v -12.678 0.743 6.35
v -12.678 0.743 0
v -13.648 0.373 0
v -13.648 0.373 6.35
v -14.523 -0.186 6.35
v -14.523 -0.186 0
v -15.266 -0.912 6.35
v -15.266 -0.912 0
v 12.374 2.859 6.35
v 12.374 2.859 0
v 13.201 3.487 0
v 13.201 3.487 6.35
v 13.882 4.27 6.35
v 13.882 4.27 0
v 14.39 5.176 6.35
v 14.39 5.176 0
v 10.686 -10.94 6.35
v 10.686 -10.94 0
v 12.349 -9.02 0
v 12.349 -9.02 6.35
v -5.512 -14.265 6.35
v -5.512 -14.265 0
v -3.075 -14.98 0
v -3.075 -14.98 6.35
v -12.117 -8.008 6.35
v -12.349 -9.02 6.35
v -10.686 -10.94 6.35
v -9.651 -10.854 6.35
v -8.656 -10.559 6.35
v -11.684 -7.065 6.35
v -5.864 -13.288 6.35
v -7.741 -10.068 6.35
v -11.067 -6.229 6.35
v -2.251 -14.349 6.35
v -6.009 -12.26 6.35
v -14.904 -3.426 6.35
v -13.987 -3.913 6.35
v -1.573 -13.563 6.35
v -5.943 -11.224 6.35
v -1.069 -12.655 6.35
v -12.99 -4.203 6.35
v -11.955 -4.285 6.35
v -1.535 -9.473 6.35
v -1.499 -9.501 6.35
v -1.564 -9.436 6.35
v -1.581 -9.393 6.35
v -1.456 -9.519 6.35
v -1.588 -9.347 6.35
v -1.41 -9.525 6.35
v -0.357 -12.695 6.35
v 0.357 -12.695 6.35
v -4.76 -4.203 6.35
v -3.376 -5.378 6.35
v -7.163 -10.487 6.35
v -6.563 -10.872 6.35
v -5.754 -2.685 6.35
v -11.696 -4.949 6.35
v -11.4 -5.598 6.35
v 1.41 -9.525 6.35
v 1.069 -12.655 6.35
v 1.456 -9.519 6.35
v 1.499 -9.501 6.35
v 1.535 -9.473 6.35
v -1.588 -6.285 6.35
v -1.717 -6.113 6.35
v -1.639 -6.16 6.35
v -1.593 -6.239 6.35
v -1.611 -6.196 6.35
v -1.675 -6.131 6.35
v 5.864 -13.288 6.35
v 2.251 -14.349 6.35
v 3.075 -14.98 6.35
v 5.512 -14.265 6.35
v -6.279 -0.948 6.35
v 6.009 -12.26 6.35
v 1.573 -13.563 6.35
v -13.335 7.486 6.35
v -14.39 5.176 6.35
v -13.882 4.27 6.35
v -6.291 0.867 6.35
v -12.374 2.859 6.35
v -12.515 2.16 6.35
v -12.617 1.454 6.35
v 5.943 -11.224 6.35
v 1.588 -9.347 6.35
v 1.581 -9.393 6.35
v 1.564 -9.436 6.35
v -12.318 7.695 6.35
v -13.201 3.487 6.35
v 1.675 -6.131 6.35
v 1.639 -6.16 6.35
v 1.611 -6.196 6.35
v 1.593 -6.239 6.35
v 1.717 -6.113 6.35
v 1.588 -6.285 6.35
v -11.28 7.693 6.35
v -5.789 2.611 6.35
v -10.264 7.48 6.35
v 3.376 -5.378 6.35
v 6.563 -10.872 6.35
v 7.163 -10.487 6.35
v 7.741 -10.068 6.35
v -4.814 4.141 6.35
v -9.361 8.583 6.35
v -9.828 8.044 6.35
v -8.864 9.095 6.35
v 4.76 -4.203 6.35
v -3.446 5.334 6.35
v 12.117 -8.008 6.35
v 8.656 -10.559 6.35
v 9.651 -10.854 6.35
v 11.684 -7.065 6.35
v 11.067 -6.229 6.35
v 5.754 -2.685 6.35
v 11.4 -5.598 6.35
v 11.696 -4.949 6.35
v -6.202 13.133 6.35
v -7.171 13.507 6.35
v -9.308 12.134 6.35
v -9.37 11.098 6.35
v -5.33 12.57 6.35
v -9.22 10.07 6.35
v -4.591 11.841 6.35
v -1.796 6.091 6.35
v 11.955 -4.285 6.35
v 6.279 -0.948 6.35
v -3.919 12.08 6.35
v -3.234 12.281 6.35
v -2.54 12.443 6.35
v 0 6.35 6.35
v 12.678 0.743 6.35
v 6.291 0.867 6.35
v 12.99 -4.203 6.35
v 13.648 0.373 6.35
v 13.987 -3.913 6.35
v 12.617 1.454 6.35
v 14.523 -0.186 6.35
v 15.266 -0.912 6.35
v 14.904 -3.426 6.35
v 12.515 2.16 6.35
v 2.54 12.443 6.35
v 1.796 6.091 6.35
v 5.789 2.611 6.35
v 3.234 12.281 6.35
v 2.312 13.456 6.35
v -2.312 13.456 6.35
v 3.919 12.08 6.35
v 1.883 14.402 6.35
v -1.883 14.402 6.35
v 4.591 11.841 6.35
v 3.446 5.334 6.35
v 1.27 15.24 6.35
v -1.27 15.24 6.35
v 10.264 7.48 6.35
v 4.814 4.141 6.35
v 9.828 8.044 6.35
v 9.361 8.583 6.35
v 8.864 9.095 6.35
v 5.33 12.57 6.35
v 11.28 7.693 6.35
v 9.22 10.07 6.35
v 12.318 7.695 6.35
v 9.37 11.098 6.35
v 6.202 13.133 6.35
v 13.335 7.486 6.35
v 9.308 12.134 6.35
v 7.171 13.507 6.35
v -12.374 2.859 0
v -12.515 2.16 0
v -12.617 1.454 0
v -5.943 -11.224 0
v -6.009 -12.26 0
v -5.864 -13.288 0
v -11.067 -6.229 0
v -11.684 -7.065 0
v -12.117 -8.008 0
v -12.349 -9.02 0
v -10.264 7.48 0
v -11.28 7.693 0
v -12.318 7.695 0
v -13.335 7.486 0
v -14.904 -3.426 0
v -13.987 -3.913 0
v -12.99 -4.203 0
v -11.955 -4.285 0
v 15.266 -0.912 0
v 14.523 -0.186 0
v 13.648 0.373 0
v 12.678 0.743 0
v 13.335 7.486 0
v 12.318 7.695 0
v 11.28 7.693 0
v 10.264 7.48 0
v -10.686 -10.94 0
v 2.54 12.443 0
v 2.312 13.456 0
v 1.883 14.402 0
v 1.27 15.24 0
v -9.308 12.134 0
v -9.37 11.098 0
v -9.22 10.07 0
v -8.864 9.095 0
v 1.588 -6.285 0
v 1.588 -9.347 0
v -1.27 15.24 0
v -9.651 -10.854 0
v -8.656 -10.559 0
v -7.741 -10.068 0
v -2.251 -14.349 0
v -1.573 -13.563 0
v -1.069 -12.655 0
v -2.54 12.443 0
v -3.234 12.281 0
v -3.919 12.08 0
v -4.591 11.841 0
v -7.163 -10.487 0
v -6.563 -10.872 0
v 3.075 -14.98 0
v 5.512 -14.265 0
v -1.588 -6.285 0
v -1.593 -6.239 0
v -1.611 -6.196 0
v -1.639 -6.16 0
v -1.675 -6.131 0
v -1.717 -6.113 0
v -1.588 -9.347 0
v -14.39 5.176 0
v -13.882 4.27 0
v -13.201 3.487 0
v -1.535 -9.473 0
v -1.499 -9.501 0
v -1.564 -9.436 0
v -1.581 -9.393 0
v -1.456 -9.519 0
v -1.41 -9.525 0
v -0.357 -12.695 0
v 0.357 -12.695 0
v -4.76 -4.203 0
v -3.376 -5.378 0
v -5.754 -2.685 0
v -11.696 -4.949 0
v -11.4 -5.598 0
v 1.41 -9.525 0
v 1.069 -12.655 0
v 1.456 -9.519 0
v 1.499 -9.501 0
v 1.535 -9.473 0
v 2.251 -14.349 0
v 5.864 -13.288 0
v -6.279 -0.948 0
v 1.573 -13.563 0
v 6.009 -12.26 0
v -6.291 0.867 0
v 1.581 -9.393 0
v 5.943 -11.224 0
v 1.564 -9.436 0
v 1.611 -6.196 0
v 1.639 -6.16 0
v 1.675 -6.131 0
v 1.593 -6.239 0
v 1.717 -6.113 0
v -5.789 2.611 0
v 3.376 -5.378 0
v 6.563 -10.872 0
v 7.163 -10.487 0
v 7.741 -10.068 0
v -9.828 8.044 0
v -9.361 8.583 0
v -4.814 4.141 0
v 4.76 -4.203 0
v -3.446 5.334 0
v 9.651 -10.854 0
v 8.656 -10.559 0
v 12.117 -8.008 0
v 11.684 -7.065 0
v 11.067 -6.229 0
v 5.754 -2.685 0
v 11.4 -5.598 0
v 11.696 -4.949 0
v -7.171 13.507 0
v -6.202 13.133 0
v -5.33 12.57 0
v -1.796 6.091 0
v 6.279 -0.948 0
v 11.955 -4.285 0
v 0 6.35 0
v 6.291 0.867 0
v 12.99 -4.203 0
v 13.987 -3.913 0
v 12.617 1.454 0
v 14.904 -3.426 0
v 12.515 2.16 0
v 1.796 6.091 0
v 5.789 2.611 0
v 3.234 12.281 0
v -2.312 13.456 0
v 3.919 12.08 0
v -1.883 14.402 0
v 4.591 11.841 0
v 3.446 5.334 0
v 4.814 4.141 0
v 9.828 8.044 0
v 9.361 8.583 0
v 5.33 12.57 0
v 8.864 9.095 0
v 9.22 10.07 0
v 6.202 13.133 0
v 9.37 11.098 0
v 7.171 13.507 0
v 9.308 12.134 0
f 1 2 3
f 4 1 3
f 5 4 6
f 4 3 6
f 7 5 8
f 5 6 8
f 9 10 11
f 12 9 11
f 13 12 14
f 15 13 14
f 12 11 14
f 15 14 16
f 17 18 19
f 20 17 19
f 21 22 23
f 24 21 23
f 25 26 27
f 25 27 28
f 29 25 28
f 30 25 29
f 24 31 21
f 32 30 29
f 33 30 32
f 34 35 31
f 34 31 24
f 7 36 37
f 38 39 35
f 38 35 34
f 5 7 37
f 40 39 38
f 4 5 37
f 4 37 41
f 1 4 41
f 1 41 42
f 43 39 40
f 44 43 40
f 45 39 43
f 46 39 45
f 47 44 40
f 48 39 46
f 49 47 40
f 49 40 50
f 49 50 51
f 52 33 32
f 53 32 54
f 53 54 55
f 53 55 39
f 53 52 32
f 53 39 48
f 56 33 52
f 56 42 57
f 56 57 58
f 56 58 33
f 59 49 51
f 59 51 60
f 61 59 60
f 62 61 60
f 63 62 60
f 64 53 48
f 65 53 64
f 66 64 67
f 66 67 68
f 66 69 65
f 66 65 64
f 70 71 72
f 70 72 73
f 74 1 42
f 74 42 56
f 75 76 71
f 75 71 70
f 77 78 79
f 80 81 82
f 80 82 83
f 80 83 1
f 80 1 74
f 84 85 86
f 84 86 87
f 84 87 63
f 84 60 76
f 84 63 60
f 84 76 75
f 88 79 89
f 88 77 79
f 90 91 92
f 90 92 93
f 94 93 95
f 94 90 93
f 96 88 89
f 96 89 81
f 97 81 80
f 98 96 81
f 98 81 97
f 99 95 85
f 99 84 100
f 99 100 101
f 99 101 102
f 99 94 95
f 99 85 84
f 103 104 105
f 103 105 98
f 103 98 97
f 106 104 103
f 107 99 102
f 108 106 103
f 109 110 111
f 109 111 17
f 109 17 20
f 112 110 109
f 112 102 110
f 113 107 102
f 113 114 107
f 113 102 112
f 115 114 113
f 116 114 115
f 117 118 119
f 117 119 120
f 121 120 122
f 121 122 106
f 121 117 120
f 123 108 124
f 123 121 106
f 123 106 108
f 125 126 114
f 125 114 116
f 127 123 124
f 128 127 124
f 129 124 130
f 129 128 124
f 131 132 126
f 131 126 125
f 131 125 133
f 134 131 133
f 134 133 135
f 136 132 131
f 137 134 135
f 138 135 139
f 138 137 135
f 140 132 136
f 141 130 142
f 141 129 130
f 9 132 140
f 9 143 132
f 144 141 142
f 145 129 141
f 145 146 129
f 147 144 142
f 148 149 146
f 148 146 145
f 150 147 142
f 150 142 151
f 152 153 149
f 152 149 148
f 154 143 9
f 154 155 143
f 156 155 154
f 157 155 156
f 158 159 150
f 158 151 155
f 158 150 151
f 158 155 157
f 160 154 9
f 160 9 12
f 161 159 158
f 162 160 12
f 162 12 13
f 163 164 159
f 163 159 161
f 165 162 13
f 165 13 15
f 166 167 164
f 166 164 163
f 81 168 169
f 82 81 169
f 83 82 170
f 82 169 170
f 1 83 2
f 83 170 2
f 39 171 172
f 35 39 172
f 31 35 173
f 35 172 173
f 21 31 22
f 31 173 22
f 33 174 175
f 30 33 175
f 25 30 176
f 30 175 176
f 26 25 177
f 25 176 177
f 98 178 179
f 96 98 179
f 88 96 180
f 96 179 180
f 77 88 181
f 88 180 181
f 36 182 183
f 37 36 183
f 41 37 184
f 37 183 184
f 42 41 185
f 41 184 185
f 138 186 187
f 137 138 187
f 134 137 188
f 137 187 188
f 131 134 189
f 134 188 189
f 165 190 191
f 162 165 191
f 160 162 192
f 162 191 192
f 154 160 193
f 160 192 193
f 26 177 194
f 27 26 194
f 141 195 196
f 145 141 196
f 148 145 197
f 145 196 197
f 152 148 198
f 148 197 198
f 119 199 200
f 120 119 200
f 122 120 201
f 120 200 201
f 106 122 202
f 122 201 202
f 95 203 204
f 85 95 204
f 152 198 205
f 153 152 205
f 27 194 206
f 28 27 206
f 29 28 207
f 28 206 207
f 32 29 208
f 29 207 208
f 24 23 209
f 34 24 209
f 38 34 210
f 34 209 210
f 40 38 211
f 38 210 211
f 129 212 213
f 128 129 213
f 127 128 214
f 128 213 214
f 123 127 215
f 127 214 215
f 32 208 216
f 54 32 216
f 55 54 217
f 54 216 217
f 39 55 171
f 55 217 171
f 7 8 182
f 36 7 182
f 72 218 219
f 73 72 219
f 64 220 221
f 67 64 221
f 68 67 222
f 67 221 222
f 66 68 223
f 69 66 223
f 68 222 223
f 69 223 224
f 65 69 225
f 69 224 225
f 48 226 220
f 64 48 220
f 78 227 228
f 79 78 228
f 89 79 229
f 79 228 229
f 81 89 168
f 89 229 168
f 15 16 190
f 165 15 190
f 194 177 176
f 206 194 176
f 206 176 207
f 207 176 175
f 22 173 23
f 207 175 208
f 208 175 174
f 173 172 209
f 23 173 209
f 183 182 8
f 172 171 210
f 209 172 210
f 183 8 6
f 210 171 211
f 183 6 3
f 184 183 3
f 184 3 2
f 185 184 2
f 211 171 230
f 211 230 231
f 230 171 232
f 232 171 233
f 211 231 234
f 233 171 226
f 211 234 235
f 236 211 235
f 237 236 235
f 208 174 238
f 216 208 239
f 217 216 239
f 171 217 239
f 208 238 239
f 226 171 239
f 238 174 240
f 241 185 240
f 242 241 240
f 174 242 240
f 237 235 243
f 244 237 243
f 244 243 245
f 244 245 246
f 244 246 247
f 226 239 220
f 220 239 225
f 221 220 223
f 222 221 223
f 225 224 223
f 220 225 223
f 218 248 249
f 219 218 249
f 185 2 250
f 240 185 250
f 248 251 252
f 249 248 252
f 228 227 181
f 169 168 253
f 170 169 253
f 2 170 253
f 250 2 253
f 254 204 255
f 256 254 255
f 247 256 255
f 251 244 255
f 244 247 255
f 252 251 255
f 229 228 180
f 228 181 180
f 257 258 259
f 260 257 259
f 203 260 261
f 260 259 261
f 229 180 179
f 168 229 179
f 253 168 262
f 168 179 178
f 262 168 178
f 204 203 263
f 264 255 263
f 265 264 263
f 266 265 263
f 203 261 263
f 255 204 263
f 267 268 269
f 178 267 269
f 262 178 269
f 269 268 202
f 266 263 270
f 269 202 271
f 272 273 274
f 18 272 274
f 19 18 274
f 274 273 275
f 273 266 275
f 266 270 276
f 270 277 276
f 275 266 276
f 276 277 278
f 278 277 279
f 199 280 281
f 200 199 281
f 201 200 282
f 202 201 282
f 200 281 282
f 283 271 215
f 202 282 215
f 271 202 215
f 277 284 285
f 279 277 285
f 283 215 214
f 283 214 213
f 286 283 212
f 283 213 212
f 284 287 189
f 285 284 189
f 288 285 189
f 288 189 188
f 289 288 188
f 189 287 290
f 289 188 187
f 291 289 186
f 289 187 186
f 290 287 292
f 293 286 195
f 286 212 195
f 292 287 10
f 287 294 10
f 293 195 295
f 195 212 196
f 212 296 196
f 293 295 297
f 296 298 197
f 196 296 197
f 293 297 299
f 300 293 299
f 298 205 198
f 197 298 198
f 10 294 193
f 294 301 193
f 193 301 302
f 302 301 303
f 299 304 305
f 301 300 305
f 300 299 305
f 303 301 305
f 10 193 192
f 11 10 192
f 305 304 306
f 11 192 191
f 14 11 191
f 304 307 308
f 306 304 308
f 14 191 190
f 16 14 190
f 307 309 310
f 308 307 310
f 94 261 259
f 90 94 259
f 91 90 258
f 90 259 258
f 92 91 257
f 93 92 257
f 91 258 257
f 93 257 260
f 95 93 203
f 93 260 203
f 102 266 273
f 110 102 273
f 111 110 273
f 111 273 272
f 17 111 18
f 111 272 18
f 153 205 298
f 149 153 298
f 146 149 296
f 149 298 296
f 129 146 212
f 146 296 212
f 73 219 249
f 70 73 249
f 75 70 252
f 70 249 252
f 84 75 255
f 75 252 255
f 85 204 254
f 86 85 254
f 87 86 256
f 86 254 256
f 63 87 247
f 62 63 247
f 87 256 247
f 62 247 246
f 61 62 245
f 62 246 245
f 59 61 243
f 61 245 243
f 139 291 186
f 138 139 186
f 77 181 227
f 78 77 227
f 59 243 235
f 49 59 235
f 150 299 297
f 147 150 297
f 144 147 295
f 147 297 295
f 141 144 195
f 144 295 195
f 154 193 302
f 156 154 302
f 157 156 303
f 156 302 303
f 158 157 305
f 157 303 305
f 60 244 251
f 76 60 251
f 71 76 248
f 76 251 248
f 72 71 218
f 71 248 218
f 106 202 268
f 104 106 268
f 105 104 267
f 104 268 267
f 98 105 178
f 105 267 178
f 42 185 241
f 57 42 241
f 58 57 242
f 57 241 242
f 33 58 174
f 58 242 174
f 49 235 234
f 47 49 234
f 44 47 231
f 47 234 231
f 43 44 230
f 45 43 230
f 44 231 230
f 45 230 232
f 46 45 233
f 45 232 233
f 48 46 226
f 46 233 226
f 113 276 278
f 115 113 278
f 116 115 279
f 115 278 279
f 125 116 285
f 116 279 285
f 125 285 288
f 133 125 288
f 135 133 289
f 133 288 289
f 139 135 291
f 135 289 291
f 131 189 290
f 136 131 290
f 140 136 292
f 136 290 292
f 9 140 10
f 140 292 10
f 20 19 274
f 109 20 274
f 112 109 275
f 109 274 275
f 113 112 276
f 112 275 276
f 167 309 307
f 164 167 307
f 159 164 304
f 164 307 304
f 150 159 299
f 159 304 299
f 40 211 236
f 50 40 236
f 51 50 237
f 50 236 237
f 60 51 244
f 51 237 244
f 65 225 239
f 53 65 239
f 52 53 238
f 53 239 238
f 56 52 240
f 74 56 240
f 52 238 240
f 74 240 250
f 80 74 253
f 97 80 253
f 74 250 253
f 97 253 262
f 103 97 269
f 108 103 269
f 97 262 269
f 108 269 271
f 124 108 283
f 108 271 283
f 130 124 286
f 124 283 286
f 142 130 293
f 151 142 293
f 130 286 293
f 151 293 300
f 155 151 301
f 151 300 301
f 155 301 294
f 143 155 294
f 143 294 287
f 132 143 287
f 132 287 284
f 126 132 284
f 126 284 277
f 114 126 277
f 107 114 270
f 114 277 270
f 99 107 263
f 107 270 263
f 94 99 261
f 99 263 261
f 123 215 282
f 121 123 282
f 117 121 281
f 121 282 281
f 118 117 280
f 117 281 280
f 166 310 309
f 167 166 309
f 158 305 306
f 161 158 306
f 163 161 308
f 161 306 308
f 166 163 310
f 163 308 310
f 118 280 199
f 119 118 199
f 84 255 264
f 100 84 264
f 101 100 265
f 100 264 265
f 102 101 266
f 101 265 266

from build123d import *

# Parameters (mm, degrees)
F1_DEPTH = 6.35


with BuildPart() as f1:
    # F0 (on Top) → F1 (new body)
    with BuildSketch(Plane.XY):
        with BuildLine():
            Line((1.27, 15.24), (-1.27, 15.24))
            ThreePointArc((-1.27, 15.24), (-2.121422, 13.939986), (-2.54, 12.443408))
            ThreePointArc((-2.54, 12.443408), (-3.578003, 12.185561), (-4.59063, 11.841289))
            ThreePointArc((-4.59063, 11.841289), (-5.751872, 12.87399), (-7.170974, 13.507318))
            Line((-7.170974, 13.507318), (-9.307758, 12.13409))
            ThreePointArc((-9.307758, 12.13409), (-9.321179, 10.580136), (-8.864198, 9.094833))
            ThreePointArc((-8.864198, 9.094833), (-9.59802, 8.316731), (-10.263768, 7.479644))
            ThreePointArc((-10.263768, 7.479644), (-11.798987, 7.720592), (-13.335215, 7.486157))
            Line((-13.335215, 7.486157), (-14.390369, 5.175692))
            ThreePointArc((-14.390369, 5.175692), (-13.561528, 3.861167), (-12.374076, 2.858713))
            ThreePointArc((-12.374076, 2.858713), (-12.570732, 1.807398), (-12.678232, 0.743265))
            ThreePointArc((-12.678232, 0.743265), (-14.100007, 0.115962), (-15.265619, -0.911805))
            Line((-15.265619, -0.911805), (-14.904139, -3.425951))
            ThreePointArc((-14.904139, -3.425951), (-13.496187, -4.083695), (-11.955272, -4.285028))
            ThreePointArc((-11.955272, -4.285028), (-11.552326, -5.275771), (-11.067446, -6.229095))
            ThreePointArc((-11.067446, -6.229095), (-11.924374, -7.525486), (-12.349297, -9.020276))
            Line((-12.349297, -9.020276), (-10.68595, -10.93988))
            ThreePointArc((-10.68595, -10.93988), (-9.145903, -10.732013), (-7.740754, -10.068303))
            ThreePointArc((-7.740754, -10.068303), (-6.866138, -10.68392), (-5.942825, -11.223762))
            ThreePointArc((-5.942825, -11.223762), (-5.962837, -12.777645), (-5.51216, -14.264873))
            Line((-5.51216, -14.264873), (-3.075048, -14.980473))
            ThreePointArc((-3.075048, -14.980473), (-1.891859, -13.972992), (-1.068601, -12.654963))
            ThreePointArc((-1.068601, -12.654963), (0, -12.7), (1.068601, -12.654963))
            ThreePointArc((1.068601, -12.654963), (1.891859, -13.972992), (3.075048, -14.980473))
            Line((3.075048, -14.980473), (5.51216, -14.264873))
            ThreePointArc((5.51216, -14.264873), (5.962837, -12.777645), (5.942825, -11.223762))
            ThreePointArc((5.942825, -11.223762), (6.866138, -10.68392), (7.740754, -10.068303))
            ThreePointArc((7.740754, -10.068303), (9.145903, -10.732013), (10.68595, -10.93988))
            Line((10.68595, -10.93988), (12.349297, -9.020276))
            ThreePointArc((12.349297, -9.020276), (11.924374, -7.525486), (11.067446, -6.229095))
            ThreePointArc((11.067446, -6.229095), (11.552326, -5.275771), (11.955272, -4.285028))
            ThreePointArc((11.955272, -4.285028), (13.496187, -4.083695), (14.904139, -3.425951))
            Line((14.904139, -3.425951), (15.265619, -0.911805))
            ThreePointArc((15.265619, -0.911805), (14.100007, 0.115962), (12.678232, 0.743265))
            ThreePointArc((12.678232, 0.743265), (12.570732, 1.807398), (12.374076, 2.858713))
            ThreePointArc((12.374076, 2.858713), (13.561528, 3.861167), (14.390369, 5.175692))
            Line((14.390369, 5.175692), (13.335215, 7.486157))
            ThreePointArc((13.335215, 7.486157), (11.798987, 7.720592), (10.263768, 7.479644))
            ThreePointArc((10.263768, 7.479644), (9.59802, 8.316731), (8.864198, 9.094833))
            ThreePointArc((8.864198, 9.094833), (9.321179, 10.580136), (9.307758, 12.13409))
            Line((9.307758, 12.13409), (7.170974, 13.507318))
            ThreePointArc((7.170974, 13.507318), (5.751872, 12.87399), (4.59063, 11.841289))
            ThreePointArc((4.59063, 11.841289), (3.578003, 12.185561), (2.54, 12.443408))
            ThreePointArc((2.54, 12.443408), (2.121422, 13.939986), (1.27, 15.24))
        make_face()
        with BuildLine():
            ThreePointArc((-1.717218, -6.1134), (0, 6.35), (1.717218, -6.1134))
            ThreePointArc((1.717218, -6.1134), (1.623593, -6.177189), (1.5875, -6.284575))
            Line((1.5875, -6.284575), (1.5875, -9.3472))
            ThreePointArc((1.5875, -9.3472), (1.535424, -9.472924), (1.4097, -9.525))
            Line((1.4097, -9.525), (-1.4097, -9.525))
            ThreePointArc((-1.4097, -9.525), (-1.535424, -9.472924), (-1.5875, -9.3472))
            Line((-1.5875, -9.3472), (-1.5875, -6.284575))
            ThreePointArc((-1.5875, -6.284575), (-1.623593, -6.177189), (-1.717218, -6.1134))
        make_face(mode=Mode.SUBTRACT)
    extrude(amount=F1_DEPTH)


solid = f1.part
